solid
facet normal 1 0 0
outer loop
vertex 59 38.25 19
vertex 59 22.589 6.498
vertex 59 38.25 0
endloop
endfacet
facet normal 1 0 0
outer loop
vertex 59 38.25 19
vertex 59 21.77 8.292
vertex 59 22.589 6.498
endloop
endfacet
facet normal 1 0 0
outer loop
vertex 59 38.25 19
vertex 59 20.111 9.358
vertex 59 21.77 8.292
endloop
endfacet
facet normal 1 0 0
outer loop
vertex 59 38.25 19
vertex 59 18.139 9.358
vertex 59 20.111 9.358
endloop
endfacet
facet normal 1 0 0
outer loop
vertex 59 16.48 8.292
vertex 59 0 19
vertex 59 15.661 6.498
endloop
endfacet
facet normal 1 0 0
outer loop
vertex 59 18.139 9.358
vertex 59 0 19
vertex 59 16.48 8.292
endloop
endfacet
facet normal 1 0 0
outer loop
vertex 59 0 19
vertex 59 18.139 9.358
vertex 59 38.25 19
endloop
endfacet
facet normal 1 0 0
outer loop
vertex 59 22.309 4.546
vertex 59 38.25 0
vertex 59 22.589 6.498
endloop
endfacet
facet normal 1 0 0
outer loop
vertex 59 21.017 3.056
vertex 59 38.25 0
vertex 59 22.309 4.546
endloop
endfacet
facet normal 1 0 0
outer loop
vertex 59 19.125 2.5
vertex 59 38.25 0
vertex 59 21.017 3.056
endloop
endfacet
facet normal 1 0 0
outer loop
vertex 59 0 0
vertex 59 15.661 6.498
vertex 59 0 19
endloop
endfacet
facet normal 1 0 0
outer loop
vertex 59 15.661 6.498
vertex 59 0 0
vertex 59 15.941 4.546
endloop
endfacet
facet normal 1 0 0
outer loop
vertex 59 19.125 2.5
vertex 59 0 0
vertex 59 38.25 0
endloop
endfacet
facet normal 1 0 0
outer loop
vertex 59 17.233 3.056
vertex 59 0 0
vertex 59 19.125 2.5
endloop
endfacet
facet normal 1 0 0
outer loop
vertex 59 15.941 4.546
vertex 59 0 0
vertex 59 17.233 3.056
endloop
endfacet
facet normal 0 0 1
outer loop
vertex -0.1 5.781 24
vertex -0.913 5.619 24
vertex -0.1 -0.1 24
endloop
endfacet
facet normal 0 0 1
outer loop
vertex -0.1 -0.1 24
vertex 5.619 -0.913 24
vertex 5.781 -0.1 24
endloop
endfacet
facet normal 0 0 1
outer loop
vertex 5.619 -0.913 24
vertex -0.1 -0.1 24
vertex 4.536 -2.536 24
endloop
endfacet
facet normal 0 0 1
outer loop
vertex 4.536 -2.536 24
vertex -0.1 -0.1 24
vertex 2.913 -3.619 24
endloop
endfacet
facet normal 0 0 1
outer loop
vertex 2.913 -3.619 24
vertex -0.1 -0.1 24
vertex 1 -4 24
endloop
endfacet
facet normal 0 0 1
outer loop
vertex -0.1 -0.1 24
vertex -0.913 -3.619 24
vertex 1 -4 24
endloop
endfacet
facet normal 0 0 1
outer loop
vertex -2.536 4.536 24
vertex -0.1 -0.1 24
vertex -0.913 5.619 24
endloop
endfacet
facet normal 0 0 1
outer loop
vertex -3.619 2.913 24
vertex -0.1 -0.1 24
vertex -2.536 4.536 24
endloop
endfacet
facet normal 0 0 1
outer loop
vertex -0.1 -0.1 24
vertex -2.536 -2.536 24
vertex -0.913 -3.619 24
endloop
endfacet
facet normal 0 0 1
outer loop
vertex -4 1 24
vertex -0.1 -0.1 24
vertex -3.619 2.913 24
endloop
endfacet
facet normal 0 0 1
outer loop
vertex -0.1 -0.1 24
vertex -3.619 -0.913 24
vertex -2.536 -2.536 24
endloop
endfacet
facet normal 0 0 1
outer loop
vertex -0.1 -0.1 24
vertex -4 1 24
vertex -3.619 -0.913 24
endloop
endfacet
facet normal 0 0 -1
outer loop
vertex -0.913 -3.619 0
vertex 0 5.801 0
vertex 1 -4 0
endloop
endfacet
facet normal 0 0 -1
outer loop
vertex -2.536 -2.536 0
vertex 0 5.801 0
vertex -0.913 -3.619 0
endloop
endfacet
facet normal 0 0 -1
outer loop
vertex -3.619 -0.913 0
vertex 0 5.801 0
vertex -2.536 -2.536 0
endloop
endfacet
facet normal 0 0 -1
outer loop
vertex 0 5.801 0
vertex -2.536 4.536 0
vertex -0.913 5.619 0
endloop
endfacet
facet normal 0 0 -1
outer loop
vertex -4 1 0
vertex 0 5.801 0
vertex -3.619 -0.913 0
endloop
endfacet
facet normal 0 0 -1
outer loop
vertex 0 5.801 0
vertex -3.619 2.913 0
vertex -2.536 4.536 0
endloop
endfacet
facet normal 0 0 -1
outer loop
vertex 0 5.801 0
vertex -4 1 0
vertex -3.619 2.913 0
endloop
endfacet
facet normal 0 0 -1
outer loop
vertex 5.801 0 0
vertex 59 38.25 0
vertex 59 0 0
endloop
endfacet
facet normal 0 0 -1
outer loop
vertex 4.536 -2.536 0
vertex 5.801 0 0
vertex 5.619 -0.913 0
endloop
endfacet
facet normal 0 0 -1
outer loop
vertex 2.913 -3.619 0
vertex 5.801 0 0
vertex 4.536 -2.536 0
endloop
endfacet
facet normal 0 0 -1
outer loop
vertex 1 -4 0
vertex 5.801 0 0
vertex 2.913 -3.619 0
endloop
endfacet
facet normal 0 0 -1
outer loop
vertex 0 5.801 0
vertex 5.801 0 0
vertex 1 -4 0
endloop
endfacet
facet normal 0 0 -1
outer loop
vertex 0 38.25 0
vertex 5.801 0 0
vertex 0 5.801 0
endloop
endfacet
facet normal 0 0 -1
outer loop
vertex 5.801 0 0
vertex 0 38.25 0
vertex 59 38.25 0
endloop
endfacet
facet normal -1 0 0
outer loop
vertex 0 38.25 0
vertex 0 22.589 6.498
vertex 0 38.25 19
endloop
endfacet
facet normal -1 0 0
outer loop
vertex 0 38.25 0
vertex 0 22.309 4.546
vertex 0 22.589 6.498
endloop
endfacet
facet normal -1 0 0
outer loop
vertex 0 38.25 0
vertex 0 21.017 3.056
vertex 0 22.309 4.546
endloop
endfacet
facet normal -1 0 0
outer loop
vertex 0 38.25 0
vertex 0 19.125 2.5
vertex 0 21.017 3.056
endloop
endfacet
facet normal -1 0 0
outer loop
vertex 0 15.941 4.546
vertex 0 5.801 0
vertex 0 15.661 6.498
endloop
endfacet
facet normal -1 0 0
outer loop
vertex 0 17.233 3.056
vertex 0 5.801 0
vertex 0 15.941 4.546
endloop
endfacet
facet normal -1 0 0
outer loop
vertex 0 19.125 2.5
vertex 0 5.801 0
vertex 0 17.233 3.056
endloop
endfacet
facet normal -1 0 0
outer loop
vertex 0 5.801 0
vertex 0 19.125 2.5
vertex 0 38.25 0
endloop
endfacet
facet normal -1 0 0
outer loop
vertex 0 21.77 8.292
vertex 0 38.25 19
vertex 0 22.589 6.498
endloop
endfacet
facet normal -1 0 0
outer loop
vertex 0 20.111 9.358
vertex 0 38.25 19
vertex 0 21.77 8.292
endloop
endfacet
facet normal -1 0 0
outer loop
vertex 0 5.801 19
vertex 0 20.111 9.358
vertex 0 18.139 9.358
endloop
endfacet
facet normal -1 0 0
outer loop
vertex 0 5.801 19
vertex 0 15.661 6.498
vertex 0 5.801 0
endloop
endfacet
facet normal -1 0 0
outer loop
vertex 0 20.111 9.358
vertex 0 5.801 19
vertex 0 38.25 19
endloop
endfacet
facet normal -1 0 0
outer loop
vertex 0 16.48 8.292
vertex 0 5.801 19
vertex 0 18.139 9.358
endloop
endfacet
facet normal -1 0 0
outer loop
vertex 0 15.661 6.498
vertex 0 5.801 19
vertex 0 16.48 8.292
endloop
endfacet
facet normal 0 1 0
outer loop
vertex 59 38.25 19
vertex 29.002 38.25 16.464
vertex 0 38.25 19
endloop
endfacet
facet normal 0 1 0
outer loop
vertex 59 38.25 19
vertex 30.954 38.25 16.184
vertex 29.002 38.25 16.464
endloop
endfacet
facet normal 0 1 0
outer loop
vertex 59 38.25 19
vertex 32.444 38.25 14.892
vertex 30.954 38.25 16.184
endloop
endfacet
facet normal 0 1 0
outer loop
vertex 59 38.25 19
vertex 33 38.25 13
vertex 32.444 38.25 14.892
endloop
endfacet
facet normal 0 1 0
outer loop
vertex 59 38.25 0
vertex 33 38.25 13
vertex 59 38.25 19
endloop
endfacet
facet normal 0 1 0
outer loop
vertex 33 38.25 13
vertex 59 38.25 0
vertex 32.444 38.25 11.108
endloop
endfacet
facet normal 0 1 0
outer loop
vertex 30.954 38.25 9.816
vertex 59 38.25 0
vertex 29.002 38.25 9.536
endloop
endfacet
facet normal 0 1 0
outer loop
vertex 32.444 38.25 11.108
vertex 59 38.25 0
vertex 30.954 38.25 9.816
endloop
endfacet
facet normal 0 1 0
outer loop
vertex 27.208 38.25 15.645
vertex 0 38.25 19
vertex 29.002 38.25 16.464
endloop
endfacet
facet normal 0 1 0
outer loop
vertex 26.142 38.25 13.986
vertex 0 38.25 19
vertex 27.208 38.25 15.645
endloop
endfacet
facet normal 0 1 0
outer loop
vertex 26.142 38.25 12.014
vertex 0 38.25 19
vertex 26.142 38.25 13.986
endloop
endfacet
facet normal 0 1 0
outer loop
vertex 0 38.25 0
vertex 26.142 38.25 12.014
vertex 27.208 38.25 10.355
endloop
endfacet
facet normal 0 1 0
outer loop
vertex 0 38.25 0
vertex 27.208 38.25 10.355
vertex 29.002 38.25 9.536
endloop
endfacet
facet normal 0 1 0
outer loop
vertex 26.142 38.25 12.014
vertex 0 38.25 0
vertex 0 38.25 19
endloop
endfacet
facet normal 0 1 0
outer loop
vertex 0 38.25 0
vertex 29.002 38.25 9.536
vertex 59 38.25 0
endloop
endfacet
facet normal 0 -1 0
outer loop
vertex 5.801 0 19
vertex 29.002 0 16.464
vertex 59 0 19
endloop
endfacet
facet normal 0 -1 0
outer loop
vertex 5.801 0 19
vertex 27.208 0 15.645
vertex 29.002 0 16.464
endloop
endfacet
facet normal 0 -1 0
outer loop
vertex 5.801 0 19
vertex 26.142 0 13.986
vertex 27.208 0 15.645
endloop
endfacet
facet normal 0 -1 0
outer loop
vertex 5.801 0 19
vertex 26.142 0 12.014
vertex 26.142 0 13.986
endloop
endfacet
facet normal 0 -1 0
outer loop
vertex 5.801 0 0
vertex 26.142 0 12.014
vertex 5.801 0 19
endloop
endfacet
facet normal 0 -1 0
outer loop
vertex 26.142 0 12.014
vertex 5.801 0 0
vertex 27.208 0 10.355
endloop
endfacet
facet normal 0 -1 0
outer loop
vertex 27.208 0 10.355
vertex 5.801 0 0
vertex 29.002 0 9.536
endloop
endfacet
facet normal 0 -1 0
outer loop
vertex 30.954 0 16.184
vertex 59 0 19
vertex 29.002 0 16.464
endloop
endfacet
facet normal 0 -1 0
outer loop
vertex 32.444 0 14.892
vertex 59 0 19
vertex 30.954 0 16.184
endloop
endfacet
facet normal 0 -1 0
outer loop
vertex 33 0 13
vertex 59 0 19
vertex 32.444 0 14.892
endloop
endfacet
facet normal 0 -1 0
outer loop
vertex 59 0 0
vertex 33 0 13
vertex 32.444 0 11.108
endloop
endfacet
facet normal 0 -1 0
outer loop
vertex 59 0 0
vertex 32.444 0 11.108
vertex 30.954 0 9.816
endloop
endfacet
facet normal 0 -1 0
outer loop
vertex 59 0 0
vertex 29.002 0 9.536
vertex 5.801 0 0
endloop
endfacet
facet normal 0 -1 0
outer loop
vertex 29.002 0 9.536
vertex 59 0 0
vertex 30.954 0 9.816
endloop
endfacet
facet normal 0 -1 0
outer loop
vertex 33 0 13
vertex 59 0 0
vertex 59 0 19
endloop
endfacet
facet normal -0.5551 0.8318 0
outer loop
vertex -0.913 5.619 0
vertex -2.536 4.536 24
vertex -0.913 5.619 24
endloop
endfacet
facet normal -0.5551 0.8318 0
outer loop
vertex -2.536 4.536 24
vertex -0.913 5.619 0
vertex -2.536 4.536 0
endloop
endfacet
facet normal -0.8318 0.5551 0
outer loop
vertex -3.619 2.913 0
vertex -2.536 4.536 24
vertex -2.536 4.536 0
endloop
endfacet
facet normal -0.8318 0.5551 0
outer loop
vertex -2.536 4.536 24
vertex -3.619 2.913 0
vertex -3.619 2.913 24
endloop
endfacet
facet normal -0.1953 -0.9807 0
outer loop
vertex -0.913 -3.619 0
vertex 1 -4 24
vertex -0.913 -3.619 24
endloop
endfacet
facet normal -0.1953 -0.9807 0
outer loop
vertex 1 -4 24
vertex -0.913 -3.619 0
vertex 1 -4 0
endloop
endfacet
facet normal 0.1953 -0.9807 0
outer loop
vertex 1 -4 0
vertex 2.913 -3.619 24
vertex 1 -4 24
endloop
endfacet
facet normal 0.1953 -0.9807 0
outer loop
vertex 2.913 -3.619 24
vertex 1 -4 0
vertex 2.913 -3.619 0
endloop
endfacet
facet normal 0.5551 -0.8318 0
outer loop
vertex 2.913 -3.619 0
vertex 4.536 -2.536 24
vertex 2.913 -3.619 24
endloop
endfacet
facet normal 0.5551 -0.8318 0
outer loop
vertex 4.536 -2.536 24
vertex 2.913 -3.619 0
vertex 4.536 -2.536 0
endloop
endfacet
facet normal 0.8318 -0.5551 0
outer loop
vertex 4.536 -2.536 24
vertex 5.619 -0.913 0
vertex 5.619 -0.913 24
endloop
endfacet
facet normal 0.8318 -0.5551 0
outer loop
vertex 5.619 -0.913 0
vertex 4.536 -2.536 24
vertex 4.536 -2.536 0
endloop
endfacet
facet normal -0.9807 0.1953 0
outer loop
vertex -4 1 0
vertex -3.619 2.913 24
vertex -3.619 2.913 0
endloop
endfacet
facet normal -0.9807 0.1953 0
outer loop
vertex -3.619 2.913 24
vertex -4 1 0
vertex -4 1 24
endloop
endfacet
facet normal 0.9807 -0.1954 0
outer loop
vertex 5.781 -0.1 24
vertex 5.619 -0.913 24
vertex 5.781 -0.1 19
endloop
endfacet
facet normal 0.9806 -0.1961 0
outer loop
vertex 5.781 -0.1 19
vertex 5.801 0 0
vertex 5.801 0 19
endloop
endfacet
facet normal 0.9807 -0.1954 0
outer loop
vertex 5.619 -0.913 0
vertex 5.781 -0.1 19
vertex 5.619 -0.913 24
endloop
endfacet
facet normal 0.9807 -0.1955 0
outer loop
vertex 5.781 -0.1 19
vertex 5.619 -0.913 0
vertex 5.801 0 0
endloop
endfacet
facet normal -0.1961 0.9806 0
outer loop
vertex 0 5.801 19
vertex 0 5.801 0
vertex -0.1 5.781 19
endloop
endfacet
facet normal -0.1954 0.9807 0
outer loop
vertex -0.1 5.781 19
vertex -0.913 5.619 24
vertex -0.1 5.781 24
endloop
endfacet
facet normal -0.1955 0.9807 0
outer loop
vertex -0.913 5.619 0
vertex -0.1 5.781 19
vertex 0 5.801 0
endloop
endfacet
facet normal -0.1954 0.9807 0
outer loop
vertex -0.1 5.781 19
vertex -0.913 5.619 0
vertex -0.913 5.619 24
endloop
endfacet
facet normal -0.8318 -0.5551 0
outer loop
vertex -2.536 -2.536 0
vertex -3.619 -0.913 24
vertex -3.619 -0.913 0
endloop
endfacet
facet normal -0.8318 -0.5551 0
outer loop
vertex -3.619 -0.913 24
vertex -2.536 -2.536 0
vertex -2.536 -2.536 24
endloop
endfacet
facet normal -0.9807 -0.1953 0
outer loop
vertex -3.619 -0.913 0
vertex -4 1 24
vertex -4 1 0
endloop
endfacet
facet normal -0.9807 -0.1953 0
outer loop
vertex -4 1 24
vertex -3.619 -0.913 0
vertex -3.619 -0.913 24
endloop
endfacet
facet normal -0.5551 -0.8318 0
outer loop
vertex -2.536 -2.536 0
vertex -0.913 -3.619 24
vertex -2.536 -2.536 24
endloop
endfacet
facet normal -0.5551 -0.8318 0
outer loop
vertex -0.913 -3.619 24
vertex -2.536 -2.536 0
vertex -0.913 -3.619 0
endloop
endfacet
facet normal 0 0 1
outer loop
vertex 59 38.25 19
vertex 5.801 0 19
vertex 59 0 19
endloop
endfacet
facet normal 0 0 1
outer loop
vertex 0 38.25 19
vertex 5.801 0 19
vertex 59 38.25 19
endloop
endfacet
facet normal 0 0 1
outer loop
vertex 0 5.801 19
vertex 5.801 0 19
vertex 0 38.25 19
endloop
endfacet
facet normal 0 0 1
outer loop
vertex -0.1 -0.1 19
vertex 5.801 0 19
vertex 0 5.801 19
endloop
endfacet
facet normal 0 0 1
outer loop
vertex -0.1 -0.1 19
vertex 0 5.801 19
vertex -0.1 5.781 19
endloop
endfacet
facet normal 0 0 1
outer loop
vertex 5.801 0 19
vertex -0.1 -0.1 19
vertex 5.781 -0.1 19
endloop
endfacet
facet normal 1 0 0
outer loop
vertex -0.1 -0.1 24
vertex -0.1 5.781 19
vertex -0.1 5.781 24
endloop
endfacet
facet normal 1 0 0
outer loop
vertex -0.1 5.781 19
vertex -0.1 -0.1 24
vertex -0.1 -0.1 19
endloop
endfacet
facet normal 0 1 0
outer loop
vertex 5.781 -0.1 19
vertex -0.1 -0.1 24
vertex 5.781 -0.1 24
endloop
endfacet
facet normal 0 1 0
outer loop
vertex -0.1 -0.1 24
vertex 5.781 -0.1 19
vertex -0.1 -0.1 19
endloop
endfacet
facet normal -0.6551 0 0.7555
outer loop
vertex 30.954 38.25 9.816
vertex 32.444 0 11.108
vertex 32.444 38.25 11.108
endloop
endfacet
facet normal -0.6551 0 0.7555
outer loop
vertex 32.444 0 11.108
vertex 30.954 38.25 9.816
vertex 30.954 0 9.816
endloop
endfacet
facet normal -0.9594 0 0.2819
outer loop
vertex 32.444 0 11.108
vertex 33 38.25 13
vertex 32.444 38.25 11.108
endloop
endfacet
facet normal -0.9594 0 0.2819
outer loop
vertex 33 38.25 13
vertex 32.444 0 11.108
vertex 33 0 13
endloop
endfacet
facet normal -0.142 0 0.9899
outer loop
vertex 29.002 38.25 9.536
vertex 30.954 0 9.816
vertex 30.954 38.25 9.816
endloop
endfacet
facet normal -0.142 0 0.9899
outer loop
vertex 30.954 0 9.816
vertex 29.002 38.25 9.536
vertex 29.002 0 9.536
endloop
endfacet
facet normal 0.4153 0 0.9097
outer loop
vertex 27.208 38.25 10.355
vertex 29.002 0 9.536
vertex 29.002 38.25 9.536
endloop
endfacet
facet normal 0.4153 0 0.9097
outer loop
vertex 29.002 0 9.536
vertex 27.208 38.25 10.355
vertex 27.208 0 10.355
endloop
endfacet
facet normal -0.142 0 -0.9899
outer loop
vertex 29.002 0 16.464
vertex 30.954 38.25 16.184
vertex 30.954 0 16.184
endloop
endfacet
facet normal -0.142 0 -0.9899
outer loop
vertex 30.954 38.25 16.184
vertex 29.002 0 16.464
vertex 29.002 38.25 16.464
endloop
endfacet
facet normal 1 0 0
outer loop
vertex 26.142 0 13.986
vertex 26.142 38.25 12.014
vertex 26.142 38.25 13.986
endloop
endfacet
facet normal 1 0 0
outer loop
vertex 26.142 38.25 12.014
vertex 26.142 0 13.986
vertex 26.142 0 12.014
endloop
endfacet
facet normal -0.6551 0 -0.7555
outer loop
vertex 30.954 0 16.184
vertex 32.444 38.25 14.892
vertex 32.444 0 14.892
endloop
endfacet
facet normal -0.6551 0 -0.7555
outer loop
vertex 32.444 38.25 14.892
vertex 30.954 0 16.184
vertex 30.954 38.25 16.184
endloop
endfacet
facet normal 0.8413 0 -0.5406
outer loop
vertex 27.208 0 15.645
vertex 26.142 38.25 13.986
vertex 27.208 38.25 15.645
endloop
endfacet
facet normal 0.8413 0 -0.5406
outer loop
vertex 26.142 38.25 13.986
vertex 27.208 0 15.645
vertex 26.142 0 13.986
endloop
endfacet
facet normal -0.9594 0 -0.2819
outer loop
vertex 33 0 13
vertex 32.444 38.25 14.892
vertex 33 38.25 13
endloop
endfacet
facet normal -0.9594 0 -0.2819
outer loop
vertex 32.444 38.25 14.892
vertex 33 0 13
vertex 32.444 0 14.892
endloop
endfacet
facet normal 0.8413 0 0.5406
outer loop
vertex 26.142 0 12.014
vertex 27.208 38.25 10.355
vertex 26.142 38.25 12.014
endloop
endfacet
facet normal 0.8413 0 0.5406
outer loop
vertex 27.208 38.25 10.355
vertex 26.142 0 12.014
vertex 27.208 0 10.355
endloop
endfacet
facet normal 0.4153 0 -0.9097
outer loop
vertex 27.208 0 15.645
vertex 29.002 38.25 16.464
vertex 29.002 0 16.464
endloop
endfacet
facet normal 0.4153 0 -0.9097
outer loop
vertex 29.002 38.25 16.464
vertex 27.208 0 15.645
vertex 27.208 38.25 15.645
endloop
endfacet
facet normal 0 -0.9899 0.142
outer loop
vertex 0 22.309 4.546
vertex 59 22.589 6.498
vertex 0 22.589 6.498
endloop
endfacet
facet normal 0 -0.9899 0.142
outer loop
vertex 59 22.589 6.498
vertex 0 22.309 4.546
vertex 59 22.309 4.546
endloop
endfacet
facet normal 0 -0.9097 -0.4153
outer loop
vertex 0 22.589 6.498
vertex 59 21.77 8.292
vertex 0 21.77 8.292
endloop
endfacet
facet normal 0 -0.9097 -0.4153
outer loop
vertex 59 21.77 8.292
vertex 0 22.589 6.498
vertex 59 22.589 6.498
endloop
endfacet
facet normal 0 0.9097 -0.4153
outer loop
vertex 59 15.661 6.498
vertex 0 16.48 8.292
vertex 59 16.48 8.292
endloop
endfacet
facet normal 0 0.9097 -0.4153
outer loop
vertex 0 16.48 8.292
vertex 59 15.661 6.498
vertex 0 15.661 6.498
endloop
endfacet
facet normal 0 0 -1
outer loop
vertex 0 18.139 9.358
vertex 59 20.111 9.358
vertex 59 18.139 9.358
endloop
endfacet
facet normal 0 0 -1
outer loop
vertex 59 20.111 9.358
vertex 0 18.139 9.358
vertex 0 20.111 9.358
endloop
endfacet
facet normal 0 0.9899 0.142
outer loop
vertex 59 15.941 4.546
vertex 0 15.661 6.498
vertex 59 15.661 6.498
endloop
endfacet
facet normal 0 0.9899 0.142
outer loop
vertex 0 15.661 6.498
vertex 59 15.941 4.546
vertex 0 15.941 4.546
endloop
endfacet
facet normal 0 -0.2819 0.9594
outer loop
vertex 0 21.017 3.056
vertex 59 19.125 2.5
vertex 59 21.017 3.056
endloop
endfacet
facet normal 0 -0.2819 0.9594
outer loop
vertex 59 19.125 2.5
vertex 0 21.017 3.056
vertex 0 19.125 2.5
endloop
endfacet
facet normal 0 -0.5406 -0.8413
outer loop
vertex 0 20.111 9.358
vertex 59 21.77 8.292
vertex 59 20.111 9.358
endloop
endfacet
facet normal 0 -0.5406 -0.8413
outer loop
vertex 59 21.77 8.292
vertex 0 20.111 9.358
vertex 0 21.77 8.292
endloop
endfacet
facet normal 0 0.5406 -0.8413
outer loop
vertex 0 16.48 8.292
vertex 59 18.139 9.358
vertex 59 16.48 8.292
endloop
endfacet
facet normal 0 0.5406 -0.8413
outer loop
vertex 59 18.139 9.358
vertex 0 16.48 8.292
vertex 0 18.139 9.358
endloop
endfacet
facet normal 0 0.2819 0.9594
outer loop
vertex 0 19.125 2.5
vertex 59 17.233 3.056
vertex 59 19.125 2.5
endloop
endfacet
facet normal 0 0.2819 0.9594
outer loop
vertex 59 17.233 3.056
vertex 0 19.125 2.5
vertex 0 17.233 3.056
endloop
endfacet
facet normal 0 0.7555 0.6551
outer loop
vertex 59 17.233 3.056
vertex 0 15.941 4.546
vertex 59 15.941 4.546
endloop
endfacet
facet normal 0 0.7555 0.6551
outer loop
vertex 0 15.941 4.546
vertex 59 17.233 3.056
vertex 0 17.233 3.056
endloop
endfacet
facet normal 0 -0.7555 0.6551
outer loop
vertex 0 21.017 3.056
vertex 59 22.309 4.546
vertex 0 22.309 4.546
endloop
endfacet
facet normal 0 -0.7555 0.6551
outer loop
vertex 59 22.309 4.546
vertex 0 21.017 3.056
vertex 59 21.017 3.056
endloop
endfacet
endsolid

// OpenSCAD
/**
Glass build plate holder 4-piece
**/

/* [Main] */
// Width of build plate (mm)
plate_width = 153; //[100:400]
// Length of build plate (mm)
plate_length = 236; //[100:400]
// Thickness of build plate (mm), may want to set this to slightly less than actual thickness
plate_thickness = 5; //[2:8]
// Side of support to print, 2 of each side required for full support
side = "left"; //[left, right]
/* [Extras] */
// Diameter of holes for threaded rod
hole_diameter = 7; //[4:10]
/* [Hidden] */
support_height = plate_thickness+(hole_diameter*2)+5;
support_diameter = plate_thickness*2;

cornerbase();

module cornerbase() {
  difference() {
    union() {
      cube([plate_length/4,plate_width/4,support_height]);
      if (side == "left") {
        translate([plate_thickness*0.2,plate_thickness*0.2,0])
          cylinder(r=support_diameter/2,h=support_height);
      } else if (side == "right") {
        translate([(plate_length/4)-(plate_thickness*0.2),plate_thickness*0.2,0])
          cylinder(r=support_diameter/2,h=support_height);
      } else {
        echo("WARNING: No Support column created, must specify left or right side!");
      }
    }
    translate([-0.1,-0.1,support_height-plate_thickness])
      cube([(plate_length/4)+1,(plate_width/4)+1,plate_thickness+1]);
    translate([plate_length/8,-0.1,(support_height-plate_thickness)/2+(hole_diameter/2)])
      rotate([270,0,0])
        cylinder(r=hole_diameter/2,h=plate_length);
    translate([-0.1,plate_width/8,(support_height-plate_thickness)/2-(hole_diameter/2)])
      rotate([0,90,0])
        cylinder(r=hole_diameter/2,h=plate_length);
  }
}
